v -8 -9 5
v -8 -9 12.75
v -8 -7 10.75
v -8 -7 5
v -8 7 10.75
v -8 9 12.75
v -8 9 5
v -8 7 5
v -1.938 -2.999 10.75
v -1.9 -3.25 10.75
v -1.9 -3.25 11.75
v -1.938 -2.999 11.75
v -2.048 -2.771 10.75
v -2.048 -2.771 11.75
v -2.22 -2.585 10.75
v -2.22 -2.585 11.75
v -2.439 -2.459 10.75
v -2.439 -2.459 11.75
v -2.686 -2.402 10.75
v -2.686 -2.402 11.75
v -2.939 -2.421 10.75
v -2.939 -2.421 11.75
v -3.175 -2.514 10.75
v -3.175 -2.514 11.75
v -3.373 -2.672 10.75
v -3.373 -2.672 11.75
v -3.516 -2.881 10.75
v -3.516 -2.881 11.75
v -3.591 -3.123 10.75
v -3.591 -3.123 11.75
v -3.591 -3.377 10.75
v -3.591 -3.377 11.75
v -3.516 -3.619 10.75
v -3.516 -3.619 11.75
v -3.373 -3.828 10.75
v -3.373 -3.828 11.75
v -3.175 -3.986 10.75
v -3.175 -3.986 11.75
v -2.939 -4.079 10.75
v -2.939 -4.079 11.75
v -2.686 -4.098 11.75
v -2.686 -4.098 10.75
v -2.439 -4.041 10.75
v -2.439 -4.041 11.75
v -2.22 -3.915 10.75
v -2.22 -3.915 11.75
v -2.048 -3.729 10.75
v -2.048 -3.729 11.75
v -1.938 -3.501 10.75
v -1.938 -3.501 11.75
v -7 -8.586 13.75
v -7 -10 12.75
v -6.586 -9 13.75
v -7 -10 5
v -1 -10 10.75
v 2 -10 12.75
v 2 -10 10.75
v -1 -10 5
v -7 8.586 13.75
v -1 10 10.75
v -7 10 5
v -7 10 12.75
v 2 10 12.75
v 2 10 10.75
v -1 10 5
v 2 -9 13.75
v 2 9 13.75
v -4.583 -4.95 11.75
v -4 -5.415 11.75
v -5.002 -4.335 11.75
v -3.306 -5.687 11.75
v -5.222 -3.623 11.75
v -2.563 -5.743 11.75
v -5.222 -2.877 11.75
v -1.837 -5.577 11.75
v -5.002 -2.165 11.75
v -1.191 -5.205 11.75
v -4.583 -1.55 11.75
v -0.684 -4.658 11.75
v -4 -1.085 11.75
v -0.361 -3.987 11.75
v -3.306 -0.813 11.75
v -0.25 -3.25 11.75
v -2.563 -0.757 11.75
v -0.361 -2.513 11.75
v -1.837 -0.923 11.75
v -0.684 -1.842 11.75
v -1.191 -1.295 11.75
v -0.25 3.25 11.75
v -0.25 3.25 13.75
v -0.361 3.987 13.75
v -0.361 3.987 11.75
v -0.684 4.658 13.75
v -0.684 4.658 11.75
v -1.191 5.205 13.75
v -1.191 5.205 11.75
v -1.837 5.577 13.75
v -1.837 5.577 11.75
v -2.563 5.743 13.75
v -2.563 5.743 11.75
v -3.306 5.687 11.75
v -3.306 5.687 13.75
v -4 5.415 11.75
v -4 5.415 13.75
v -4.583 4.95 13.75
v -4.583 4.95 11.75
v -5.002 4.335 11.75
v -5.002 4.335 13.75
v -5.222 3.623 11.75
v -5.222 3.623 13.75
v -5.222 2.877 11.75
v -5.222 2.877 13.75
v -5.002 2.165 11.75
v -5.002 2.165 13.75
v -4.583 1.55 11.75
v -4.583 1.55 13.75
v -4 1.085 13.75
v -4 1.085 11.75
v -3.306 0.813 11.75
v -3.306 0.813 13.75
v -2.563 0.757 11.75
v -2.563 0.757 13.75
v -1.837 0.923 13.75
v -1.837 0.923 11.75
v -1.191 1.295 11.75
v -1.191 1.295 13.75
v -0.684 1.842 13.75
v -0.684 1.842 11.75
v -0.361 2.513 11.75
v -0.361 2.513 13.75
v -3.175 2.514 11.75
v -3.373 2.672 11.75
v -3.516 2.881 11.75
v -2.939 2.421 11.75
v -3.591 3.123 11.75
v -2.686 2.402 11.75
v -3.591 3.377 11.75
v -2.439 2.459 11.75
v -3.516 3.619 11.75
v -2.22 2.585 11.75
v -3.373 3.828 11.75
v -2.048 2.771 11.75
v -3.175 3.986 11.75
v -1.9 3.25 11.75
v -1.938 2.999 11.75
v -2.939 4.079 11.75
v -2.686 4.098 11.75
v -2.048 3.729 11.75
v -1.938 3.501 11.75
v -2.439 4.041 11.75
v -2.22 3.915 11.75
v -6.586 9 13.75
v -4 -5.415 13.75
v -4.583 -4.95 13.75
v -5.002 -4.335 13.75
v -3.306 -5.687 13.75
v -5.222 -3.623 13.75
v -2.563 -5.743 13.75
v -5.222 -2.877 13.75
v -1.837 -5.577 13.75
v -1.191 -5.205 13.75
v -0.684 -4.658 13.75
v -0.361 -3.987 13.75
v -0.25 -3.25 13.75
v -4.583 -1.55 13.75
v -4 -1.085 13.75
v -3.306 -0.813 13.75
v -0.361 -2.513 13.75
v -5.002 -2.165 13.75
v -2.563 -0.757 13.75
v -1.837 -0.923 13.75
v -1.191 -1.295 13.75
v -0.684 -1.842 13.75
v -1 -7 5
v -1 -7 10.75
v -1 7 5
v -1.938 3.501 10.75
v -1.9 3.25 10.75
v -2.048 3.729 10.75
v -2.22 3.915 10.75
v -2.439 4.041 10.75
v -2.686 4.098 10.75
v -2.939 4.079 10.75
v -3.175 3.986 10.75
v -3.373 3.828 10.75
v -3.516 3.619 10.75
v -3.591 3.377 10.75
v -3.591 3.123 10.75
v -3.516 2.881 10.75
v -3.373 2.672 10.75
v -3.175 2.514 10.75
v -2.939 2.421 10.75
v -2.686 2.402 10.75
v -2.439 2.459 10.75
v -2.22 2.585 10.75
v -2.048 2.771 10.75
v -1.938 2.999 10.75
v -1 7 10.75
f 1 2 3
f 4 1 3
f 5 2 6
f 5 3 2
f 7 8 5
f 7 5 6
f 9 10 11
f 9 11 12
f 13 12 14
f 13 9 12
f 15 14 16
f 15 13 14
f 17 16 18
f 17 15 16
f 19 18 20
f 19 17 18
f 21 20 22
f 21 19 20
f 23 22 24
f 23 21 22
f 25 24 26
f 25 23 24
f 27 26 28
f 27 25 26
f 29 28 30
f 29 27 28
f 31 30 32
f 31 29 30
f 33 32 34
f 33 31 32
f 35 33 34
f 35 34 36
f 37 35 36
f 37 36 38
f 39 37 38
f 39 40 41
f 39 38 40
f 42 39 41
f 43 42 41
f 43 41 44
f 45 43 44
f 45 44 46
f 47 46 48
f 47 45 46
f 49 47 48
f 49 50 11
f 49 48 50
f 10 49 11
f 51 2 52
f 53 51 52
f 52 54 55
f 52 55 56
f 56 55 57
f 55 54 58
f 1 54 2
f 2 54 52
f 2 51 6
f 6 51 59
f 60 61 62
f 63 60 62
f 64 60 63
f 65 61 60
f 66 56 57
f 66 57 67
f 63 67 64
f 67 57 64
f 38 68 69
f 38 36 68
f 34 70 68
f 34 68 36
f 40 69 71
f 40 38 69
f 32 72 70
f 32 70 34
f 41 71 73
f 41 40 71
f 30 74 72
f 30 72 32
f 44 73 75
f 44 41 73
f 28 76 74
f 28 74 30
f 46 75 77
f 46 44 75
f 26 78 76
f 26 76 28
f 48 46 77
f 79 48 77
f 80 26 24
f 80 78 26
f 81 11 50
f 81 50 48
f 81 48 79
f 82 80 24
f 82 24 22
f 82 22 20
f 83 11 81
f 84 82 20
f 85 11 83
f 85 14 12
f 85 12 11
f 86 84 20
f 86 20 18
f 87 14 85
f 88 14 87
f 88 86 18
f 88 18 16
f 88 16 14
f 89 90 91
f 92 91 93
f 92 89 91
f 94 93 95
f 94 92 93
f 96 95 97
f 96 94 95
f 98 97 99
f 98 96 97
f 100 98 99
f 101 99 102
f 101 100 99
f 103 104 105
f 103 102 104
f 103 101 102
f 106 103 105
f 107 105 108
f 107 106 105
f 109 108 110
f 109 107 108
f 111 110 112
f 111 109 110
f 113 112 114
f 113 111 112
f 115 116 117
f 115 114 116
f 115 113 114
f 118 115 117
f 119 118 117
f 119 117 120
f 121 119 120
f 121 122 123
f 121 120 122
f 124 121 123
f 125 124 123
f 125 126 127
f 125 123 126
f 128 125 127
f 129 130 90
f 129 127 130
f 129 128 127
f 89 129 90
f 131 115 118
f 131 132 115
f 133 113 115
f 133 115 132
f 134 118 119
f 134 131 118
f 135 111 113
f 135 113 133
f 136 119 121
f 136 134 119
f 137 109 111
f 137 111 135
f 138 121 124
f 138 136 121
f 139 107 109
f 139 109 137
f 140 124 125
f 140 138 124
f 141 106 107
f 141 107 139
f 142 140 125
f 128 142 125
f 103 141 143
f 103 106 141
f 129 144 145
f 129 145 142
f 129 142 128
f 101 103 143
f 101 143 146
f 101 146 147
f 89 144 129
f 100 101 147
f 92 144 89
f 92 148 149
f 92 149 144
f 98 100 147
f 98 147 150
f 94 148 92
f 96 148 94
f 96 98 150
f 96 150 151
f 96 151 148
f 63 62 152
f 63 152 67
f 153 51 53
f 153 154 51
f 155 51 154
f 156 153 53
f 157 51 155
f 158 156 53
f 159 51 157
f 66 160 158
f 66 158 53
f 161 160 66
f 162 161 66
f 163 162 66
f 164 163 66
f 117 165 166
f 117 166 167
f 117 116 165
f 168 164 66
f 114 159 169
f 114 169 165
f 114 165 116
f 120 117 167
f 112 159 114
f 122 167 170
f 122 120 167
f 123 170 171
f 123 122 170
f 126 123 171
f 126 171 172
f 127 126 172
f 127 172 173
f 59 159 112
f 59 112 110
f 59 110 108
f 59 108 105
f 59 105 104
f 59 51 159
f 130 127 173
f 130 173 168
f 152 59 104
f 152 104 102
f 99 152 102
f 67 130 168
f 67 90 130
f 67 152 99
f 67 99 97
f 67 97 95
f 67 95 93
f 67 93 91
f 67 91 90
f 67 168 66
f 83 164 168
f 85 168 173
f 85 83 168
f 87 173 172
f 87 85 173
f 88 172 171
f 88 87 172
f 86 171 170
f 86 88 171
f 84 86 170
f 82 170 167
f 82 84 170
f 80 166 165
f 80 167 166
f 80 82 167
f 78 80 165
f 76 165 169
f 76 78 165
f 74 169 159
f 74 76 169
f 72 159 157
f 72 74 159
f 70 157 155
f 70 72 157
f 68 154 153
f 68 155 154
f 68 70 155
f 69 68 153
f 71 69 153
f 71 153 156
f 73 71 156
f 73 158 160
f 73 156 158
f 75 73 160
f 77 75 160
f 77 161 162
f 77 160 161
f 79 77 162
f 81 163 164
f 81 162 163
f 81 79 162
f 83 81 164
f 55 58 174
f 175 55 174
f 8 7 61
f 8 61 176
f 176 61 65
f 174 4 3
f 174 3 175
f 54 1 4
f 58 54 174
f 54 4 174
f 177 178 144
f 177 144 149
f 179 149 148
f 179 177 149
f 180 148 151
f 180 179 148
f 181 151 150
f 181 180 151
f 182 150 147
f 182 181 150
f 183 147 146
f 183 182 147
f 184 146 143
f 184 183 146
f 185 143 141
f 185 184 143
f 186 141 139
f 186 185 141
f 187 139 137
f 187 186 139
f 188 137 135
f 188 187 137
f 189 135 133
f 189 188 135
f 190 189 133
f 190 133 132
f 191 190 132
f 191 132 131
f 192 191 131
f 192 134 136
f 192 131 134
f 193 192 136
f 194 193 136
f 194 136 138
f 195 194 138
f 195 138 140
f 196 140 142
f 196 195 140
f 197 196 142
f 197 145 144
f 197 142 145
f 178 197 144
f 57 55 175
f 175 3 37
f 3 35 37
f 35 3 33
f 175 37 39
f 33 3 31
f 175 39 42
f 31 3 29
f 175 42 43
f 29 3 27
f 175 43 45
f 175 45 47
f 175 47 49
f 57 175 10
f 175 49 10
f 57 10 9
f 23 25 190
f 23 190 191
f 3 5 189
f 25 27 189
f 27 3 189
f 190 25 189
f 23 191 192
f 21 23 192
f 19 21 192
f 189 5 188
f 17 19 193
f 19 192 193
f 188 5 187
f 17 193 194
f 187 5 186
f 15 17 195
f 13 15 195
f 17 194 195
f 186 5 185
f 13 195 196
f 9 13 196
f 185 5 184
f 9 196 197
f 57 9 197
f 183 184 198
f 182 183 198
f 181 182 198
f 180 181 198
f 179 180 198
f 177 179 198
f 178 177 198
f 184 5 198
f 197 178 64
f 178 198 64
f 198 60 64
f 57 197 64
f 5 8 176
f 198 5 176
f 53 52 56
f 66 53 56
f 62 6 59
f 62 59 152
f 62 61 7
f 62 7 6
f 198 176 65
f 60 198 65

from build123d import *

# Parameters (mm, degrees)
BOX021_W          = 7
BOX021_H          = 3
BOX021_DEPTH      = 7
CHAMFER010_SIZE   = 1
BOX020_W          = 7
BOX020_H          = 3
BOX020_DEPTH      = 7
CHAMFER011_SIZE   = 1
CYLINDER026_R     = 2.5
CYLINDER026_DEPTH = 5
CYLINDER027_R     = 2.5
CYLINDER027_DEPTH = 5
CYLINDER029_R     = 0.85
CYLINDER029_DEPTH = 18
CYLINDER028_R     = 0.85
CYLINDER028_DEPTH = 18
BOX022_W          = 10
BOX022_H          = 20
BOX022_DEPTH      = 3
CHAMFER012_SIZE   = 1
CHAMFER013_SIZE   = 1


with BuildPart() as chamfer010:
    # Box021 → Box021 (new body)
    with BuildSketch(Plane(origin=(-8, 7, 5), x_dir=(1, 0, 0), z_dir=(0, 0, 1))):
        with Locations((3.5, 1.5)):
            Rectangle(BOX021_W, BOX021_H)
    extrude(amount=BOX021_DEPTH)

    # Chamfer010
    chamfer010_edges = [chamfer010.edges().sort_by_distance(p)[0] for p in [
        (-8, 10, 8.5),
    ]]
    chamfer(chamfer010_edges, length=CHAMFER010_SIZE)


with BuildPart() as chamfer011:
    # Box020 → Box020 (new body)
    with BuildSketch(Plane(origin=(-8, -10, 5), x_dir=(1, 0, 0), z_dir=(0, 0, 1))):
        with Locations((3.5, 1.5)):
            Rectangle(BOX020_W, BOX020_H)
    extrude(amount=BOX020_DEPTH)

    # Chamfer011
    chamfer011_edges = [chamfer011.edges().sort_by_distance(p)[0] for p in [
        (-8, -10, 8.5),
    ]]
    chamfer(chamfer011_edges, length=CHAMFER011_SIZE)


with BuildPart() as cylinder026:
    # Cylinder026 → Cylinder026 (new body)
    with BuildSketch(Plane(origin=(-2.75, 3.25, 0), x_dir=(1, 0, 0), z_dir=(0, 0, 1))):
        Circle(CYLINDER026_R)
    extrude(amount=CYLINDER026_DEPTH)


with BuildPart() as fusion001001001011002006:
    # Cylinder027 → Cylinder027 (new body)
    with BuildSketch(Plane(origin=(-2.75, -3.25, 0), x_dir=(1, 0, 0), z_dir=(0, 0, 1))):
        Circle(CYLINDER027_R)
    extrude(amount=CYLINDER027_DEPTH)

    # Fusion001001001011002006: union Cylinder026
    add(cylinder026.part)


with BuildPart() as fusion001001001011002006_1:
    # Fusion001001001011002006 placement: moved
    add(fusion001001001011002006.part.moved(Location((0, 0, 12))))


with BuildPart() as cylinder029:
    # Cylinder029 → Cylinder029 (new body)
    with BuildSketch(Plane(origin=(-2.75, 3.25, 0), x_dir=(1, 0, 0), z_dir=(0, 0, 1))):
        Circle(CYLINDER029_R)
    extrude(amount=CYLINDER029_DEPTH)


with BuildPart() as fusion001001001011002005:
    # Cylinder028 → Cylinder028 (new body)
    with BuildSketch(Plane(origin=(-2.75, -3.25, 0), x_dir=(1, 0, 0), z_dir=(0, 0, 1))):
        Circle(CYLINDER028_R)
    extrude(amount=CYLINDER028_DEPTH)

    # Fusion001001001011002005: union Cylinder029
    add(cylinder029.part)


with BuildPart() as fusion001001001011002004002:
    # Box022 → Box022 (new body)
    with BuildSketch(Plane(origin=(-8, -10, 10.5), x_dir=(1, 0, 0), z_dir=(0, 0, 1))):
        with Locations((5, 10)):
            Rectangle(BOX022_W, BOX022_H)
    extrude(amount=BOX022_DEPTH)

    # Chamfer012
    chamfer012_edges = [fusion001001001011002004002.edges().sort_by_distance(p)[0] for p in [
        (-8, -10, 12),
        (-8, 10, 12),
    ]]
    chamfer(chamfer012_edges, length=CHAMFER012_SIZE)

    # Chamfer013
    chamfer013_edges = [fusion001001001011002004002.edges().sort_by_distance(p)[0] for p in [
        (-8, 0, 13.5),
        (-7.5, -9.5, 13.5),
        (-7.5, 9.5, 13.5),
        (-2.5, -10, 13.5),
        (-2.5, 10, 13.5),
    ]]
    chamfer(chamfer013_edges, length=CHAMFER013_SIZE)

    # Cut002008023012009006003002006002006002004004003: cut Fusion001001001011002005
    add(fusion001001001011002005.part, mode=Mode.SUBTRACT)


with BuildPart() as fusion001001001011002004002_1:
    # Cut002008023012009006003002006002006002004004003 placement: moved
    add(fusion001001001011002004002.part.moved(Location((0, 0, 0.5))))

    # Cut002008023012009006003002006002006002004004004: cut Fusion001001001011002006
    add(fusion001001001011002006_1.part, mode=Mode.SUBTRACT)


with BuildPart() as fusion001001001011002004002_2:
    # Cut002008023012009006003002006002006002004004004 placement: moved
    add(fusion001001001011002004002_1.part.moved(Location((0, 0, -0.25))))

    # Fusion001001001011002004002: union Chamfer010, Chamfer011
    add(chamfer010.part)
    add(chamfer011.part)


solid = fusion001001001011002004002_2.part
